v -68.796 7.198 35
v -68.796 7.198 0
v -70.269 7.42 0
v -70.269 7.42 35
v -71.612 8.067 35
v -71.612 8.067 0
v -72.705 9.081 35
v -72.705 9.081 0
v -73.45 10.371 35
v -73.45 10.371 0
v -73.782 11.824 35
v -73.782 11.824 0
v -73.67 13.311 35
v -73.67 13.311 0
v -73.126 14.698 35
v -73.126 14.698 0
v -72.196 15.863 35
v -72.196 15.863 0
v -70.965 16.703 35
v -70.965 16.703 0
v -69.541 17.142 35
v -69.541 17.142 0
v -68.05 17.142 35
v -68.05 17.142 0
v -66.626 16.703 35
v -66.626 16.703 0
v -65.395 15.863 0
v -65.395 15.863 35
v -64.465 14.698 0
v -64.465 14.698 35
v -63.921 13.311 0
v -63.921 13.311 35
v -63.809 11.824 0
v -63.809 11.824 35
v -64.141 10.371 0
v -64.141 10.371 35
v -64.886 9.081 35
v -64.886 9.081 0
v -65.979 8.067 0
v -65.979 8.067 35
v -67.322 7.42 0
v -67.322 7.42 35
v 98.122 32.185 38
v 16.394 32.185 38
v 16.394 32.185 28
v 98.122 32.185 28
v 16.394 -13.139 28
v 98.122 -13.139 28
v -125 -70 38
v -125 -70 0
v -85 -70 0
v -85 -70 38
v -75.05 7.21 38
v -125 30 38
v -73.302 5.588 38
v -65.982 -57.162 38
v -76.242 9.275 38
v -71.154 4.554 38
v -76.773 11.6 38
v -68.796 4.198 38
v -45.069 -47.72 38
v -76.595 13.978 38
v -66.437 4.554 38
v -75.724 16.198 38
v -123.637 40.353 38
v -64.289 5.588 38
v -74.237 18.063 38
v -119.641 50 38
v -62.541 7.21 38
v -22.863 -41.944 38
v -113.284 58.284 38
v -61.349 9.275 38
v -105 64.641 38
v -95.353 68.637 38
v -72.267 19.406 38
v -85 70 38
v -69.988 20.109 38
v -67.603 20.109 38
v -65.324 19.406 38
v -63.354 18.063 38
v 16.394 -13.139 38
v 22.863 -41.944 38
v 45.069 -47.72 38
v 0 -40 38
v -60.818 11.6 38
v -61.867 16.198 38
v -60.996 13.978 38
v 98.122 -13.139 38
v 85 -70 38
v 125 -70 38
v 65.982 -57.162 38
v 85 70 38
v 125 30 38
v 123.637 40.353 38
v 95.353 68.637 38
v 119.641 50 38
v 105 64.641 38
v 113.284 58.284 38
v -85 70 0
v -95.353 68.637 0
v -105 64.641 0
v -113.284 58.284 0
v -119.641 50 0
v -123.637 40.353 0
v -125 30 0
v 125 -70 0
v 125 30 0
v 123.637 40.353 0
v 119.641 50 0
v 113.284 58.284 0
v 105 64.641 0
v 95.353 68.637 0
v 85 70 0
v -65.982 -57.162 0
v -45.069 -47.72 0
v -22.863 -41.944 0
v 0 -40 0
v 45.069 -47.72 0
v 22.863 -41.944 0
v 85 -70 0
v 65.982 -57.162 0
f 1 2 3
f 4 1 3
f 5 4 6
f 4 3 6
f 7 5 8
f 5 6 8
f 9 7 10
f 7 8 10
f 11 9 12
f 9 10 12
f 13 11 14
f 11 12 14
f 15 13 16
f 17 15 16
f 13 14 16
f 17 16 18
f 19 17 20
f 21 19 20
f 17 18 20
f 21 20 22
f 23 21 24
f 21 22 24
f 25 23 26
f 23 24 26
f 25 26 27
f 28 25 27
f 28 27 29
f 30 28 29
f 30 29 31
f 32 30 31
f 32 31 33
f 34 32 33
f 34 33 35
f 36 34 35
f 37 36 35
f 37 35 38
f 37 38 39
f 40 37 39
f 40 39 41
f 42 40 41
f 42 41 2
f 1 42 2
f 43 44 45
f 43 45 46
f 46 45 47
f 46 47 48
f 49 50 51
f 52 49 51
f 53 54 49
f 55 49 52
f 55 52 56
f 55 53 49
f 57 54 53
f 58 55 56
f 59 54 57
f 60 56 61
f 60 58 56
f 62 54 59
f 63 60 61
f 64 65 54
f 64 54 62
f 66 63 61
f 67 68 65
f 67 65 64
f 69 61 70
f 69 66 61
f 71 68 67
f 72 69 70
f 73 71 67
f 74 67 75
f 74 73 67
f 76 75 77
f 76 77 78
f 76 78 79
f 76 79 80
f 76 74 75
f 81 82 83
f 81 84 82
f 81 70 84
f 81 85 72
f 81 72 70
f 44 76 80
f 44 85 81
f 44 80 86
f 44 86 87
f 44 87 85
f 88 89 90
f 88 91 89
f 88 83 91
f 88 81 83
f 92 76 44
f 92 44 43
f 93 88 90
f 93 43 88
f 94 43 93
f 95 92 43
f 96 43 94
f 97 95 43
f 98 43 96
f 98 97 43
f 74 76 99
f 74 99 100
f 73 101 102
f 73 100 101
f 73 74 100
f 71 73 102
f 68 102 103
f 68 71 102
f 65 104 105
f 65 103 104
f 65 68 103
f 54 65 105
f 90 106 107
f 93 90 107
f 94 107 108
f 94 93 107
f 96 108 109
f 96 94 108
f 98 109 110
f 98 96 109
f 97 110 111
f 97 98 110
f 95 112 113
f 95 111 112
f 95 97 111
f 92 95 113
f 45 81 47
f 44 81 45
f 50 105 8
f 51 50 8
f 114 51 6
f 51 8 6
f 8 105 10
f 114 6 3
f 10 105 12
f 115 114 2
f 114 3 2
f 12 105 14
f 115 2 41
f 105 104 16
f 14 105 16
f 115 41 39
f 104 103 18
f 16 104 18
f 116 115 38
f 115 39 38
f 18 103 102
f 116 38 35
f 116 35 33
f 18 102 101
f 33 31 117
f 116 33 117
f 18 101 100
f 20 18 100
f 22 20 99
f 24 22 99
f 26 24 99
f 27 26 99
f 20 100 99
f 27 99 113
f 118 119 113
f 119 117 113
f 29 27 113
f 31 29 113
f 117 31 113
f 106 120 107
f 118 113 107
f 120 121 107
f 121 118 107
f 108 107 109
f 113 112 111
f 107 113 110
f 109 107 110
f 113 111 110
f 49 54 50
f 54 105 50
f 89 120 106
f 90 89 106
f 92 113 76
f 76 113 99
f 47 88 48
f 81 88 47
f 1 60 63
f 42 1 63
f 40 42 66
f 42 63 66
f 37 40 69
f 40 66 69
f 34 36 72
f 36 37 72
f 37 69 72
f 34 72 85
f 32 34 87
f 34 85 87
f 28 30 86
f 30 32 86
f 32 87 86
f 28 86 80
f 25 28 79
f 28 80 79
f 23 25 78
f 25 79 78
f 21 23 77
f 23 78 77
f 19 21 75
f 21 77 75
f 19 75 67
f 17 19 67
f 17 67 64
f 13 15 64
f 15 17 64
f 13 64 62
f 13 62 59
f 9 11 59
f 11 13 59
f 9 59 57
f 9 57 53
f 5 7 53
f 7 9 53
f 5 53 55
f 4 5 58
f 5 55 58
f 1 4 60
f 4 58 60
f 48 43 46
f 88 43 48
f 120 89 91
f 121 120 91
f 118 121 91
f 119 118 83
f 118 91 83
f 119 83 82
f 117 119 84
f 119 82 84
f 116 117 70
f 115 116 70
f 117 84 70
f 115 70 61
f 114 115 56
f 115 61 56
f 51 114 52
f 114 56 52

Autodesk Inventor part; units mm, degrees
ref_plane "YZ Plane" through (0, 0, 0) normal (1, 0, 0) x (0, 1, 0)
ref_plane "XZ Plane" through (0, 0, 0) normal (0, 1, 0) x (-1, 0, 0)
ref_plane "XY Plane" through (0, 0, 0) normal (0, 0, 1) x (1, 0, 0)
sketch "Sketch1" plane through (0, 0, 0) normal (0, 0, 1) x (1, 0, 0)
  line L0 (-125, -70) -> (125, -70)
  line L1 (125, -70) -> (125, 70)
  line L2 (125, 70) -> (-125, 70)
  line L3 (-125, 70) -> (-125, -70)
  line L4 (-125, -70) -> (125, 70) construction
  line L5 (125, -70) -> (-125, 70) construction
  point P0 (0, 0)
  dimension "d0" = 250
  dimension "d1" = 140
extrude "Extrusion1" add sketch "Sketch1" along normal blind 38
sketch "Sketch2" plane through (0, 0, 38) normal (0, 0, 1) x (1, 0, 0)
  line L0 (125, -70) -> (125, 70) projected
  line L1 (125, 70) -> (-125, 70) projected
  line L2 (-125, 70) -> (-125, -70) projected
  line L3 (-125, -70) -> (125, -70) projected
  line L4 (-125, -70) -> (125, -70) projected
  arc A0 (85, -70) -> (-85, -70) centre (0, -175.4167) ccw
  line L5 (53.4733, -40) -> (-37.6413, -40) construction
  point P0 (0, 0)
  point P1 (85, -70)
  dimension "d5" = 40
  dimension "d114" = 30
extrude "Extrusion2" cut sketch "Sketch2" against normal through all contours L3 A0
fillet "Fillet1" radius 40 2 edges at (125, 70, 19) (-125, 70, 19)
sketch "Sketch3" plane through (0, 0, 38) normal (0, 0, 1) x (1, 0, 0)
  point P0 (0, 0)
  point P1 (-68.7955, 12.1981)
hole "Hole1" at (-68.7955, 12.1981, 38) direction (0, 0, -1) diameter 10 end through all countersink diameter 16 countersink angle 90
sketch "Sketch4" plane through (0, 0, 38) normal (0, 0, 1) x (1, 0, 0)
  line L0 (16.3939, 32.185) -> (98.1222, 32.185)
  line L1 (98.1222, 32.185) -> (98.1222, -13.1392)
  line L2 (98.1222, -13.1392) -> (16.3939, -13.1392)
  line L3 (16.3939, -13.1392) -> (16.3939, 32.185)
  point P0 (0, 0)
extrude "Extrusion3" cut sketch "Sketch4" against normal blind 10
properties part number "Demo Covering Queue 2" material "MLBRD"
